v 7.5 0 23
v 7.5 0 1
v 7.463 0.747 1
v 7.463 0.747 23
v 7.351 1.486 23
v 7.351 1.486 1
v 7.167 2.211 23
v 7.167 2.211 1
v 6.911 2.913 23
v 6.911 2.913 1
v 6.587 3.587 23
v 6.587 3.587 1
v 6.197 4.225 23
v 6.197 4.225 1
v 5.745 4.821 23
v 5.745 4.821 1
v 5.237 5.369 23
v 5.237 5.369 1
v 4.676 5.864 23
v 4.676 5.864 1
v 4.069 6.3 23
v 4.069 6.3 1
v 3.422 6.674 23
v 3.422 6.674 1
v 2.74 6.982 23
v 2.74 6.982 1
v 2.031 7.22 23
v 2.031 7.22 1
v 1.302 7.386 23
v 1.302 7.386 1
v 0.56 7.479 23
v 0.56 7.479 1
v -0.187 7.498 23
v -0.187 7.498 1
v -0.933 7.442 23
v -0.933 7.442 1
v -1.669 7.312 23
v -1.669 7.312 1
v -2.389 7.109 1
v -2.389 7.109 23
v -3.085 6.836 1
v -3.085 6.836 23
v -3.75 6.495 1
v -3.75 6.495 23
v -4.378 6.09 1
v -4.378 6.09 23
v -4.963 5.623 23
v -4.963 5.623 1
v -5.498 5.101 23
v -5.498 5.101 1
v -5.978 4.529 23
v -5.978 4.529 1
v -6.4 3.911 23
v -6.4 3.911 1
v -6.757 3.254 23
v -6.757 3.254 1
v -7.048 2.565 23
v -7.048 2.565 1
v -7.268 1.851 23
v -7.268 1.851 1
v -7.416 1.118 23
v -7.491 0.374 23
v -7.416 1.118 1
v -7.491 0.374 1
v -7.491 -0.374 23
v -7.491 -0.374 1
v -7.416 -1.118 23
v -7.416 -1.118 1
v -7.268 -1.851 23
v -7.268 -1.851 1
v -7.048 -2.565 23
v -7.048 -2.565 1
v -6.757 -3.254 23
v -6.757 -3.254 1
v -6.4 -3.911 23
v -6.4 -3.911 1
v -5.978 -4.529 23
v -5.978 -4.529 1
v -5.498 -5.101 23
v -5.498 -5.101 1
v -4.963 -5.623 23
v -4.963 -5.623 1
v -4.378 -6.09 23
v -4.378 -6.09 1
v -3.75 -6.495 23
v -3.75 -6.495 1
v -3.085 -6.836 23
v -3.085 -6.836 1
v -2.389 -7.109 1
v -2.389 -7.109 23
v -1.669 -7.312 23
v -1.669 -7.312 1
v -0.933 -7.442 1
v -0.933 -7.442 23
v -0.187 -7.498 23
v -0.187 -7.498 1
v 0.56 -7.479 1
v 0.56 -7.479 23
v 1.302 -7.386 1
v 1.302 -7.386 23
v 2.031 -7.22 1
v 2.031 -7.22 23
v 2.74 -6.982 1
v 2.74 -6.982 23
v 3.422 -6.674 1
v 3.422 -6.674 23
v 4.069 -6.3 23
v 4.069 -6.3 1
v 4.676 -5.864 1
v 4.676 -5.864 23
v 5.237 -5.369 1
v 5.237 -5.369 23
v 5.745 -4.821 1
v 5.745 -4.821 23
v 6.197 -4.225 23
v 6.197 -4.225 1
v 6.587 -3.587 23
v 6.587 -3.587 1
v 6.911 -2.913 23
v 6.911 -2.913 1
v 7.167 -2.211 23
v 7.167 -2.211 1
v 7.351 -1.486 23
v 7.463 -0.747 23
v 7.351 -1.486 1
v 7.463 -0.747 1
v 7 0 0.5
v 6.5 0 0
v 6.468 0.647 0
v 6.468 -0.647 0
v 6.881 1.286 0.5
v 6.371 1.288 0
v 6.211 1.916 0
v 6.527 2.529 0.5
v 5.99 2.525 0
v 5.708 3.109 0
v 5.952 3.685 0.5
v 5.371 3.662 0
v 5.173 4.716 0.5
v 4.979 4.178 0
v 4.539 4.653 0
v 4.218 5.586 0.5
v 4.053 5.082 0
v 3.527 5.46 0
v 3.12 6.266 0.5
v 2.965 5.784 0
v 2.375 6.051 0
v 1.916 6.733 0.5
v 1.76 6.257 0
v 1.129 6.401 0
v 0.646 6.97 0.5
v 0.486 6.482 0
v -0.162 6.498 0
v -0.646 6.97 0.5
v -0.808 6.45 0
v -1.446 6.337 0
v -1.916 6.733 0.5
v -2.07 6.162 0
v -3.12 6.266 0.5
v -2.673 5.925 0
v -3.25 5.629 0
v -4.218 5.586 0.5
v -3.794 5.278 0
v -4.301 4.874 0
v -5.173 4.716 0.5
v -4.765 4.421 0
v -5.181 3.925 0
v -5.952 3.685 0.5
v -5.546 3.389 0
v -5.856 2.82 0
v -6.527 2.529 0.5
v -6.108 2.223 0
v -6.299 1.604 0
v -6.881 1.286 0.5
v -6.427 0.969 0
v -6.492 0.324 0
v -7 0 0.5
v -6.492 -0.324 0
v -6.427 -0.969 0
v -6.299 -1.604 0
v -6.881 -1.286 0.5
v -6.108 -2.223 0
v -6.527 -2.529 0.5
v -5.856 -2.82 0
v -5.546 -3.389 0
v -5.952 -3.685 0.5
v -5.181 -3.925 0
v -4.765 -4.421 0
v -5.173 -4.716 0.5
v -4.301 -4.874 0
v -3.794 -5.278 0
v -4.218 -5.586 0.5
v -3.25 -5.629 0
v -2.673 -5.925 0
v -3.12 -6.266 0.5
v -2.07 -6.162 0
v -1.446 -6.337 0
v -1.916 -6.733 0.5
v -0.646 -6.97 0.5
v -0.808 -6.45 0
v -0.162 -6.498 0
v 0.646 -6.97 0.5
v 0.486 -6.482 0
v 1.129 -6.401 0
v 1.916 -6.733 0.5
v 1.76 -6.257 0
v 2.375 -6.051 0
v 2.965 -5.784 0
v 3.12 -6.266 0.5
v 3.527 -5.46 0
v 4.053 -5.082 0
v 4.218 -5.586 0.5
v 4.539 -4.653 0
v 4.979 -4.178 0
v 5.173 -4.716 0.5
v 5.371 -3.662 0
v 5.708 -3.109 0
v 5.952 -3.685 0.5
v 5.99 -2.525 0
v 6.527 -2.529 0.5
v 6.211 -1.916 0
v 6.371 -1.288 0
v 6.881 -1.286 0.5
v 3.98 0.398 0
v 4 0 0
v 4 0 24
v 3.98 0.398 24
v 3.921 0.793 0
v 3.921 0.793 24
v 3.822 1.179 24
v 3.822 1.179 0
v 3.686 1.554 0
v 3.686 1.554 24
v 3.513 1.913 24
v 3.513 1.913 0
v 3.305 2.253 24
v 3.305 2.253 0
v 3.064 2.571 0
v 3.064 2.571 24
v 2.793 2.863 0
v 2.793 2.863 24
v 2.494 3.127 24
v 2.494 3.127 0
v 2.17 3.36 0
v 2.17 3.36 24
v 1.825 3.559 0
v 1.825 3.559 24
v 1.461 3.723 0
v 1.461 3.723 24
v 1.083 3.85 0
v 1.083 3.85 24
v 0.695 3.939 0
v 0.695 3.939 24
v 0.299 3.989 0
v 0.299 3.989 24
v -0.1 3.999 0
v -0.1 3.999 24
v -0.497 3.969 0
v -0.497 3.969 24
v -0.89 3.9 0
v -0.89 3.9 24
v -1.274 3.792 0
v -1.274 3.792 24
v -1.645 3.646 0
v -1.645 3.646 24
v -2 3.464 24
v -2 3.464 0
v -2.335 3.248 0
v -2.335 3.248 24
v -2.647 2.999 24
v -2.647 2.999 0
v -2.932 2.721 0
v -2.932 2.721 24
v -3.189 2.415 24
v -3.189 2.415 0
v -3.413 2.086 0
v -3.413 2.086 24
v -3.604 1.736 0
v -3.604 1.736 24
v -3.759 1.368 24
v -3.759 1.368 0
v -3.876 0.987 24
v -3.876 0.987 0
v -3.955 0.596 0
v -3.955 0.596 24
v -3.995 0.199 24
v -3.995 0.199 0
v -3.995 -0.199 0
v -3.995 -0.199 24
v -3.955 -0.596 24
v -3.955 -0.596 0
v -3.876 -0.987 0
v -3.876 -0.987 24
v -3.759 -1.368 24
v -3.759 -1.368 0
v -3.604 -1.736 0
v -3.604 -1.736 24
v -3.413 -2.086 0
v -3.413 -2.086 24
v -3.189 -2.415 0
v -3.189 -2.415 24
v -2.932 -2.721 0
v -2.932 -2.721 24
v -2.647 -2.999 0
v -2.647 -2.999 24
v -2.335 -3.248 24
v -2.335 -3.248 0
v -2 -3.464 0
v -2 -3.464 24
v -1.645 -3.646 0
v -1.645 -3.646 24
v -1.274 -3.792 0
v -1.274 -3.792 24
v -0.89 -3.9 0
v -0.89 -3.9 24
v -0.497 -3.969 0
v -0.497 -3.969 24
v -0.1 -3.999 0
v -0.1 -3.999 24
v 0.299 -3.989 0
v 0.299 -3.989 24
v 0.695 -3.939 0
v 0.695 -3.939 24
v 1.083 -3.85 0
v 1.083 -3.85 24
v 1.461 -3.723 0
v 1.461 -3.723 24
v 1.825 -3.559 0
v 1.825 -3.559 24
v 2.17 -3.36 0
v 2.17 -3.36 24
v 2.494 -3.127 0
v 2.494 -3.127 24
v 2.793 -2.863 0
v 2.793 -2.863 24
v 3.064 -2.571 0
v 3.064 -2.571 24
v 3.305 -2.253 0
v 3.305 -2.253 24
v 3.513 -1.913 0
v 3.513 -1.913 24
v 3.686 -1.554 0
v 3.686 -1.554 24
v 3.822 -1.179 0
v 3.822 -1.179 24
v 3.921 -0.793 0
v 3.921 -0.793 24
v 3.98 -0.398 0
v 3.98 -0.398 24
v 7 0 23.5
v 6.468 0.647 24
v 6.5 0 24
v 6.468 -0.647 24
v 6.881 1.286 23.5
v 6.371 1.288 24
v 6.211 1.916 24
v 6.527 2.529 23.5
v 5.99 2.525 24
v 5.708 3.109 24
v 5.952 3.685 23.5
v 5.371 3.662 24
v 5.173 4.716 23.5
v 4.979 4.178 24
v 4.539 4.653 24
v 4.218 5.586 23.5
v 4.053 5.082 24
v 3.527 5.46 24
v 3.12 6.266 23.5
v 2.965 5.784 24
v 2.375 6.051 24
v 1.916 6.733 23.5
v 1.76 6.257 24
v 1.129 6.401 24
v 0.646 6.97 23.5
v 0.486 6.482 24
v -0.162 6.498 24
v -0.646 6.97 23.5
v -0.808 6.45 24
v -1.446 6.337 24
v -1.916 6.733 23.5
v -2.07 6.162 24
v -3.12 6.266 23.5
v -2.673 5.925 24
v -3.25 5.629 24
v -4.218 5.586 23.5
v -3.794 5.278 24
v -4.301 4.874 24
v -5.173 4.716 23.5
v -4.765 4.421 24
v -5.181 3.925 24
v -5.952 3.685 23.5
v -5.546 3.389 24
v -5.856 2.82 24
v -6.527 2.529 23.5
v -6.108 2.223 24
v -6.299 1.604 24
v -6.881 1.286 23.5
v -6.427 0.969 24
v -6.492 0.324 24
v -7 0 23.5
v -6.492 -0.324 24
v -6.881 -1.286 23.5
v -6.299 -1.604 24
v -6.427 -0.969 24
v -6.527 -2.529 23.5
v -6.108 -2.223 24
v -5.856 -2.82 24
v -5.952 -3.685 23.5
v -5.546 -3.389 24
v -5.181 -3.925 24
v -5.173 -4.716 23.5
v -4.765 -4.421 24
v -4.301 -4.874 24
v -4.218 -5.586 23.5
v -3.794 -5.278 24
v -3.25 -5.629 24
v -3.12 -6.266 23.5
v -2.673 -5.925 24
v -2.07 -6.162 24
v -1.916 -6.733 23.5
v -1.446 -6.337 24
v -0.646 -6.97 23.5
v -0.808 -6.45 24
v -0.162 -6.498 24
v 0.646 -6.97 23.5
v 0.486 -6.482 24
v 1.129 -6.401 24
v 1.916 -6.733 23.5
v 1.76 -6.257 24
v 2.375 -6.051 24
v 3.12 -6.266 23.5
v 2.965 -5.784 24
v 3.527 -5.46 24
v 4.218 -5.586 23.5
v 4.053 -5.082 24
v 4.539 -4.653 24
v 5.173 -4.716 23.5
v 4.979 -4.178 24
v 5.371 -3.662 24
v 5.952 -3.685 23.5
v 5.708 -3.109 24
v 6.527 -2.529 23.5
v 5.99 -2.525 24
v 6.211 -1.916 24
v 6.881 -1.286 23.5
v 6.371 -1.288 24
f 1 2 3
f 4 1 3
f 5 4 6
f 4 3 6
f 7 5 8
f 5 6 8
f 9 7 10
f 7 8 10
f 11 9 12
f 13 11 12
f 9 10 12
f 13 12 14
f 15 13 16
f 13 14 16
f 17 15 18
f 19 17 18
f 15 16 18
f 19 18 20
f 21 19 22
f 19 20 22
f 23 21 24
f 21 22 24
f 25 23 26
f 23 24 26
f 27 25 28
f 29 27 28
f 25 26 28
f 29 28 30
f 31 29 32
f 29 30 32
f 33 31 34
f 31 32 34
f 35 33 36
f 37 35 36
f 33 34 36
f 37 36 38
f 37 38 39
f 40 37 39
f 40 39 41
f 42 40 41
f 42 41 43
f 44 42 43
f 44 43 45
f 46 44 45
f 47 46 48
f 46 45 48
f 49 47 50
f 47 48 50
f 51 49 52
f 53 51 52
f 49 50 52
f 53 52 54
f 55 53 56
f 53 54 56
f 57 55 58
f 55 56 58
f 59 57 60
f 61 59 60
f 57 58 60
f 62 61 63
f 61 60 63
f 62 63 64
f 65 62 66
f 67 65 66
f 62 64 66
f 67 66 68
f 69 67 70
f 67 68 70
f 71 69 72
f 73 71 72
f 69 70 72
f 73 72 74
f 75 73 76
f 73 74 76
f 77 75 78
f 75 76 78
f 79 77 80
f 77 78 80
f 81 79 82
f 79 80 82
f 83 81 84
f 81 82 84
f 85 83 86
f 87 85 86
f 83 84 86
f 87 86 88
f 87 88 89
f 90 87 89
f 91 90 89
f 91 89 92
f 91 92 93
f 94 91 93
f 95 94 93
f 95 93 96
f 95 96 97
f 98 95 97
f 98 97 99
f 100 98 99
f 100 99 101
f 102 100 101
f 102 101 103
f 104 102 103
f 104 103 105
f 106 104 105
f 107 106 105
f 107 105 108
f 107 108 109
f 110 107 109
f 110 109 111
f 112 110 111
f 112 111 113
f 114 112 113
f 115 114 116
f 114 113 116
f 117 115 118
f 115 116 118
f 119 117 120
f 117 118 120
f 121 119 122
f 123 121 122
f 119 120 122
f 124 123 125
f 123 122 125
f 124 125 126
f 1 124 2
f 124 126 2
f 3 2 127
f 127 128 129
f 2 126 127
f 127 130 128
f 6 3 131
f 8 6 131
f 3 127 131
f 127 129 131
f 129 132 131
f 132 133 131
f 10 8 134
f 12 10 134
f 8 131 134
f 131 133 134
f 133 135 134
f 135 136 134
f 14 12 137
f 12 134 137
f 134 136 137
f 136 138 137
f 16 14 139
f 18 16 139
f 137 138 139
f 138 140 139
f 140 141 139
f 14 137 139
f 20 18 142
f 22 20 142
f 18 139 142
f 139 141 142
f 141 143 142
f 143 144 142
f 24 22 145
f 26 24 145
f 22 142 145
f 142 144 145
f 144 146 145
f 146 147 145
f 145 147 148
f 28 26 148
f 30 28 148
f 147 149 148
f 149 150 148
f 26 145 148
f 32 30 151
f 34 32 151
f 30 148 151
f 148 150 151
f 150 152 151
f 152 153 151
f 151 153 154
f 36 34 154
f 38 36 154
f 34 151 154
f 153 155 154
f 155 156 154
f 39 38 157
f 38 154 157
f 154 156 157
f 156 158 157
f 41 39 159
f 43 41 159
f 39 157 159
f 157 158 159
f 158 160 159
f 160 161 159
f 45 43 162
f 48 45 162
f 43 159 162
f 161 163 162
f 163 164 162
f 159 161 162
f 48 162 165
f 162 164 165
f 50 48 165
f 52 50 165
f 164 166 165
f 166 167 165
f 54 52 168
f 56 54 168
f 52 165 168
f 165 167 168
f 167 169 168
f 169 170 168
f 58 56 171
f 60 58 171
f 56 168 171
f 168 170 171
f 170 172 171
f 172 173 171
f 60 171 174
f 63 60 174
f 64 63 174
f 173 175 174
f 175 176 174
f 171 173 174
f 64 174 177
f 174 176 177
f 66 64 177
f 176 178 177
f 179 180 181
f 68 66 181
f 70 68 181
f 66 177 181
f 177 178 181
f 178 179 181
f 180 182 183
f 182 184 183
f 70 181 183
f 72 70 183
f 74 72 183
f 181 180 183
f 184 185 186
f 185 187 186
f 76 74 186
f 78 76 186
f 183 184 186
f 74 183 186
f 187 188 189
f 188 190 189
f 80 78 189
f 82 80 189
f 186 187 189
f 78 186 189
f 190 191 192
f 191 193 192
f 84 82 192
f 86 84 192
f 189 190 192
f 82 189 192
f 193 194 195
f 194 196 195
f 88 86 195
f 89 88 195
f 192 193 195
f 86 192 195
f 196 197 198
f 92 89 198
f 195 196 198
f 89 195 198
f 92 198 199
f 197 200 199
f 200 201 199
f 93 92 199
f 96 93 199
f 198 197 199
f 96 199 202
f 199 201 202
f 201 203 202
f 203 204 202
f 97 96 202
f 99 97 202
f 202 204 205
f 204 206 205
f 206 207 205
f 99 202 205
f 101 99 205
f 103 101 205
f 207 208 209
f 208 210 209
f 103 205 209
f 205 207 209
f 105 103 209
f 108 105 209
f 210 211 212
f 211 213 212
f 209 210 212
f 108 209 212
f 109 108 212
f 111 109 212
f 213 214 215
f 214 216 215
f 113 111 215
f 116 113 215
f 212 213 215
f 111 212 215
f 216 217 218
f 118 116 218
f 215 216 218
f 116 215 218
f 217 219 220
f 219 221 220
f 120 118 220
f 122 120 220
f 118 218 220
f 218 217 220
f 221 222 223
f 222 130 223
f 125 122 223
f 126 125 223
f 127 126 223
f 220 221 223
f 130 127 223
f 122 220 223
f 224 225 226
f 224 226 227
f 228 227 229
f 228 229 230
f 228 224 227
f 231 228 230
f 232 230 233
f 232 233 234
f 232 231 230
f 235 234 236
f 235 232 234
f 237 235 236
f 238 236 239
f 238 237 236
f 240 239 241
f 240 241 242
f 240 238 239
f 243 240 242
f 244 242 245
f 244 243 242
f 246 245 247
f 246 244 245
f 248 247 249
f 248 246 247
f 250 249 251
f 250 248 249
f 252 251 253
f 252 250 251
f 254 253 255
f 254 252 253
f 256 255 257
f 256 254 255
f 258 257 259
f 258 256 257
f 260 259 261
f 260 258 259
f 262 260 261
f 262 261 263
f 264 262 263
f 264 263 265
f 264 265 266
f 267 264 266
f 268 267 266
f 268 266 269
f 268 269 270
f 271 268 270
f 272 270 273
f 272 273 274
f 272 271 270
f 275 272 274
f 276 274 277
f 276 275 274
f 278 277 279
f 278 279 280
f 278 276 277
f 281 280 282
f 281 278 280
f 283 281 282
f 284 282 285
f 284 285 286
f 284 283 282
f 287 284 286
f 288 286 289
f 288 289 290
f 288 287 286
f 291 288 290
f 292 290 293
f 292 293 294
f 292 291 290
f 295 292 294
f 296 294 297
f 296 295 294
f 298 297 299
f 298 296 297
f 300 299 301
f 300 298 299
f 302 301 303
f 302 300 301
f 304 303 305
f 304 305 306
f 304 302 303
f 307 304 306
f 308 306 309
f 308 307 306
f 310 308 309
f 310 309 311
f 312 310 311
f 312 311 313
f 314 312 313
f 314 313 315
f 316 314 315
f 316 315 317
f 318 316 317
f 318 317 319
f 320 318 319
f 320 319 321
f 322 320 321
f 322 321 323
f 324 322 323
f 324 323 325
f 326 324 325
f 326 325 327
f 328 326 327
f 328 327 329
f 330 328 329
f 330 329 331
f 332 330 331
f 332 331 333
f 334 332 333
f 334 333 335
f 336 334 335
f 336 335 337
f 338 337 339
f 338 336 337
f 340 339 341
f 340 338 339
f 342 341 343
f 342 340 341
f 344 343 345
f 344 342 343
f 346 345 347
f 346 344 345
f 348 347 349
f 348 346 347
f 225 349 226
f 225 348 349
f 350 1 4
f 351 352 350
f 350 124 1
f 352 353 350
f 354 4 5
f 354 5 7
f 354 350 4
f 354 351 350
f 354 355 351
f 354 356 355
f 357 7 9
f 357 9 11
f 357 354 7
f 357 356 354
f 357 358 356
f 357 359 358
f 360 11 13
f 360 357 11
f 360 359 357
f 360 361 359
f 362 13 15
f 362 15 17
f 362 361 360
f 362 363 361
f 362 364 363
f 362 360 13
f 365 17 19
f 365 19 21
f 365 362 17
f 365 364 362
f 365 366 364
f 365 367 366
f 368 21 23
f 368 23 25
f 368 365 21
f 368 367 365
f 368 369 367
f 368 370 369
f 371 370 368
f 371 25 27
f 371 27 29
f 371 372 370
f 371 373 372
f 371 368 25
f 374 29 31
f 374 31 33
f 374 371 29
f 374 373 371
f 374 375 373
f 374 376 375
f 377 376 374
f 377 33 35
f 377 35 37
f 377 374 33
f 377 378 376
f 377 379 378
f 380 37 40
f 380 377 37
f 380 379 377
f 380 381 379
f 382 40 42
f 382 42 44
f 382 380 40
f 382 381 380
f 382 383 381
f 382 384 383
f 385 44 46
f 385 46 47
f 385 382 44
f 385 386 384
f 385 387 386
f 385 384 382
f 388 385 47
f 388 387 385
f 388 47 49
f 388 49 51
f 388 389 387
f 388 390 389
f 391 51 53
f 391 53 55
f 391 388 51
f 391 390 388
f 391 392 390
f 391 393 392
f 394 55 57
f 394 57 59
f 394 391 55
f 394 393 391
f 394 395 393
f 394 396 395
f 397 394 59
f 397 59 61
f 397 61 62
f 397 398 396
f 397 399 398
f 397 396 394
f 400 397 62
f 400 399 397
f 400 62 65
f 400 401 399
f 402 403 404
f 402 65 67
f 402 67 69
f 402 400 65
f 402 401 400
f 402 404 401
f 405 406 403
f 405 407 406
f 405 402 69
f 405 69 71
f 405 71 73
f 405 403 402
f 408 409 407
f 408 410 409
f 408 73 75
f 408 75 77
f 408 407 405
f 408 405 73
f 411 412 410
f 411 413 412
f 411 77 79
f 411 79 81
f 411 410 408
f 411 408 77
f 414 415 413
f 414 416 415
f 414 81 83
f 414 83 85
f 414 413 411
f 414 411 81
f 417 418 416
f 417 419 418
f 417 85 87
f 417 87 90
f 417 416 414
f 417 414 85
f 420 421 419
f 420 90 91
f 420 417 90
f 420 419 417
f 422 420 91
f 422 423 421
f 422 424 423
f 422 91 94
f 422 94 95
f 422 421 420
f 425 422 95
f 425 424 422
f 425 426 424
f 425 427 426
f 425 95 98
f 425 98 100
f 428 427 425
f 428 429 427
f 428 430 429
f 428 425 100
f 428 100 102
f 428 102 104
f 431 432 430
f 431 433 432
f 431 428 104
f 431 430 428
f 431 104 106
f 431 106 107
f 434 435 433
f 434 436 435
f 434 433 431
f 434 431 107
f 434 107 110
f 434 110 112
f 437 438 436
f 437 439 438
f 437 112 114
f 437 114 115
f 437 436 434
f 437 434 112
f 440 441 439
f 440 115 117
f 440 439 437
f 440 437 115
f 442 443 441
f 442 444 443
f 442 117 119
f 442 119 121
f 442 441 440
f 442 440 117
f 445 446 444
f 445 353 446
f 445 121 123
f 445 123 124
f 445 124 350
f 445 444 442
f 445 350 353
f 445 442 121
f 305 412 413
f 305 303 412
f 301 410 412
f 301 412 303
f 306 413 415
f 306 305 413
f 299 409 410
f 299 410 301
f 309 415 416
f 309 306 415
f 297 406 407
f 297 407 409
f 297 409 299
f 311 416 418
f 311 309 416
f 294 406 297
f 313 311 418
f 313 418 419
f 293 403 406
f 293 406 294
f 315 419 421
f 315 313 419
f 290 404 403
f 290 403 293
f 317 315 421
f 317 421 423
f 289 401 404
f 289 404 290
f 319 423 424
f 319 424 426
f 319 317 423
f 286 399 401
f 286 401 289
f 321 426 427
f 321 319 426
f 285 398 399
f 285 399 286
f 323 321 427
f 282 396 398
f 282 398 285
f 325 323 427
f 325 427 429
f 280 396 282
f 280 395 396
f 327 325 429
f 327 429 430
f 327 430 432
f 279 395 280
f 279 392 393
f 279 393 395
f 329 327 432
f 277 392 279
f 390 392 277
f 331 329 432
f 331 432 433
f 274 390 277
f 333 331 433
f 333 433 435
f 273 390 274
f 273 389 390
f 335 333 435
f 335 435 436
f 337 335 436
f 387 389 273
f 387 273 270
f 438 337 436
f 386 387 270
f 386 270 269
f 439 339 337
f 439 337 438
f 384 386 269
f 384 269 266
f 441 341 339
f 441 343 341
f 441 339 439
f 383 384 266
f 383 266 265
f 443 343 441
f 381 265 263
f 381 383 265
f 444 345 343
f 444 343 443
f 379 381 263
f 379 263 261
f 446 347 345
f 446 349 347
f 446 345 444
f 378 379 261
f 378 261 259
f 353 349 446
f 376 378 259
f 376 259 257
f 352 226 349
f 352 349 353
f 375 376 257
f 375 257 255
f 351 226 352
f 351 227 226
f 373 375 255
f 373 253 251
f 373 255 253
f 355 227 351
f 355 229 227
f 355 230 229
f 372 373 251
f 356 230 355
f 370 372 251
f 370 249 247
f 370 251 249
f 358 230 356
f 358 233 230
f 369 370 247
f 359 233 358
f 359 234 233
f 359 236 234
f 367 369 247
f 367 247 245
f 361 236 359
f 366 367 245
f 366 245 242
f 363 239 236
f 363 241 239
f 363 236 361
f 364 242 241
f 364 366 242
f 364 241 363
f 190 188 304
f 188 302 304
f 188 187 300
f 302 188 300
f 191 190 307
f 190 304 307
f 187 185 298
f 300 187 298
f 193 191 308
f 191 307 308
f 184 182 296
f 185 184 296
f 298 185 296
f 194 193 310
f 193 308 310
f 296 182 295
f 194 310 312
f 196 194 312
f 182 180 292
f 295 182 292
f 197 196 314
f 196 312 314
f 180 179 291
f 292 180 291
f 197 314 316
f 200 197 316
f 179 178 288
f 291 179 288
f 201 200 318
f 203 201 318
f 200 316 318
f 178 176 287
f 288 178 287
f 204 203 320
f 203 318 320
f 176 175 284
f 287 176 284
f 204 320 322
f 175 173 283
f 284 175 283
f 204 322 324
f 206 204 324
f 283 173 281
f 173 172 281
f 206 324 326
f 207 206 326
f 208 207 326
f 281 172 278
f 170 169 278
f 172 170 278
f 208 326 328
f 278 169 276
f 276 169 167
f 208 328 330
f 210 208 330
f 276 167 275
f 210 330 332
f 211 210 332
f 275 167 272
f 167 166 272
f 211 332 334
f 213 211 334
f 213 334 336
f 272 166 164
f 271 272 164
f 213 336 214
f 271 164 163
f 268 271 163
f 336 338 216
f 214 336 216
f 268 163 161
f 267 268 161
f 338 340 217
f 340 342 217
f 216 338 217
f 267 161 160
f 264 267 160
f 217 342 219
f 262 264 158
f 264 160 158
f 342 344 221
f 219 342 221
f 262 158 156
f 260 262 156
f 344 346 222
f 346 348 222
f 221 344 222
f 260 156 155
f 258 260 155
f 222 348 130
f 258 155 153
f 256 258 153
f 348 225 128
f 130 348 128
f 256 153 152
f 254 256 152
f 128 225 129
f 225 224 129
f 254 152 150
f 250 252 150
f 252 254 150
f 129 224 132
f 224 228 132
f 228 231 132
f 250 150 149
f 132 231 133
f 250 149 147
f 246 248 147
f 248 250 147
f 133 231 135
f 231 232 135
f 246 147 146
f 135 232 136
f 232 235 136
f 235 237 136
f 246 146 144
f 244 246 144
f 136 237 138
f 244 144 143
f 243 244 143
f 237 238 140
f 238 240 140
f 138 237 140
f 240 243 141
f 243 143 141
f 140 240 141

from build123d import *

# Parameters (mm, degrees)
SKETCH_R        = 7.5
SKETCH_R_2      = 4
PAD_DEPTH       = 24
CHAMFER_SIZE    = 1
CHAMFER001_SIZE = 1


with BuildPart() as part:
    # Sketch → Pad (new body)
    with BuildSketch(Plane.XY):
        Circle(SKETCH_R)
        Circle(SKETCH_R_2, mode=Mode.SUBTRACT)
    extrude(amount=PAD_DEPTH)

    # Chamfer
    chamfer_edges = [part.edges().sort_by_distance(p)[0] for p in [
        (-7.5, 0, 24),
    ]]
    chamfer(chamfer_edges, length=CHAMFER_SIZE)

    # Chamfer001
    chamfer001_edges = [part.edges().sort_by_distance(p)[0] for p in [
        (-7.5, 0, 0),
    ]]
    chamfer(chamfer001_edges, length=CHAMFER001_SIZE)


solid = part.part
